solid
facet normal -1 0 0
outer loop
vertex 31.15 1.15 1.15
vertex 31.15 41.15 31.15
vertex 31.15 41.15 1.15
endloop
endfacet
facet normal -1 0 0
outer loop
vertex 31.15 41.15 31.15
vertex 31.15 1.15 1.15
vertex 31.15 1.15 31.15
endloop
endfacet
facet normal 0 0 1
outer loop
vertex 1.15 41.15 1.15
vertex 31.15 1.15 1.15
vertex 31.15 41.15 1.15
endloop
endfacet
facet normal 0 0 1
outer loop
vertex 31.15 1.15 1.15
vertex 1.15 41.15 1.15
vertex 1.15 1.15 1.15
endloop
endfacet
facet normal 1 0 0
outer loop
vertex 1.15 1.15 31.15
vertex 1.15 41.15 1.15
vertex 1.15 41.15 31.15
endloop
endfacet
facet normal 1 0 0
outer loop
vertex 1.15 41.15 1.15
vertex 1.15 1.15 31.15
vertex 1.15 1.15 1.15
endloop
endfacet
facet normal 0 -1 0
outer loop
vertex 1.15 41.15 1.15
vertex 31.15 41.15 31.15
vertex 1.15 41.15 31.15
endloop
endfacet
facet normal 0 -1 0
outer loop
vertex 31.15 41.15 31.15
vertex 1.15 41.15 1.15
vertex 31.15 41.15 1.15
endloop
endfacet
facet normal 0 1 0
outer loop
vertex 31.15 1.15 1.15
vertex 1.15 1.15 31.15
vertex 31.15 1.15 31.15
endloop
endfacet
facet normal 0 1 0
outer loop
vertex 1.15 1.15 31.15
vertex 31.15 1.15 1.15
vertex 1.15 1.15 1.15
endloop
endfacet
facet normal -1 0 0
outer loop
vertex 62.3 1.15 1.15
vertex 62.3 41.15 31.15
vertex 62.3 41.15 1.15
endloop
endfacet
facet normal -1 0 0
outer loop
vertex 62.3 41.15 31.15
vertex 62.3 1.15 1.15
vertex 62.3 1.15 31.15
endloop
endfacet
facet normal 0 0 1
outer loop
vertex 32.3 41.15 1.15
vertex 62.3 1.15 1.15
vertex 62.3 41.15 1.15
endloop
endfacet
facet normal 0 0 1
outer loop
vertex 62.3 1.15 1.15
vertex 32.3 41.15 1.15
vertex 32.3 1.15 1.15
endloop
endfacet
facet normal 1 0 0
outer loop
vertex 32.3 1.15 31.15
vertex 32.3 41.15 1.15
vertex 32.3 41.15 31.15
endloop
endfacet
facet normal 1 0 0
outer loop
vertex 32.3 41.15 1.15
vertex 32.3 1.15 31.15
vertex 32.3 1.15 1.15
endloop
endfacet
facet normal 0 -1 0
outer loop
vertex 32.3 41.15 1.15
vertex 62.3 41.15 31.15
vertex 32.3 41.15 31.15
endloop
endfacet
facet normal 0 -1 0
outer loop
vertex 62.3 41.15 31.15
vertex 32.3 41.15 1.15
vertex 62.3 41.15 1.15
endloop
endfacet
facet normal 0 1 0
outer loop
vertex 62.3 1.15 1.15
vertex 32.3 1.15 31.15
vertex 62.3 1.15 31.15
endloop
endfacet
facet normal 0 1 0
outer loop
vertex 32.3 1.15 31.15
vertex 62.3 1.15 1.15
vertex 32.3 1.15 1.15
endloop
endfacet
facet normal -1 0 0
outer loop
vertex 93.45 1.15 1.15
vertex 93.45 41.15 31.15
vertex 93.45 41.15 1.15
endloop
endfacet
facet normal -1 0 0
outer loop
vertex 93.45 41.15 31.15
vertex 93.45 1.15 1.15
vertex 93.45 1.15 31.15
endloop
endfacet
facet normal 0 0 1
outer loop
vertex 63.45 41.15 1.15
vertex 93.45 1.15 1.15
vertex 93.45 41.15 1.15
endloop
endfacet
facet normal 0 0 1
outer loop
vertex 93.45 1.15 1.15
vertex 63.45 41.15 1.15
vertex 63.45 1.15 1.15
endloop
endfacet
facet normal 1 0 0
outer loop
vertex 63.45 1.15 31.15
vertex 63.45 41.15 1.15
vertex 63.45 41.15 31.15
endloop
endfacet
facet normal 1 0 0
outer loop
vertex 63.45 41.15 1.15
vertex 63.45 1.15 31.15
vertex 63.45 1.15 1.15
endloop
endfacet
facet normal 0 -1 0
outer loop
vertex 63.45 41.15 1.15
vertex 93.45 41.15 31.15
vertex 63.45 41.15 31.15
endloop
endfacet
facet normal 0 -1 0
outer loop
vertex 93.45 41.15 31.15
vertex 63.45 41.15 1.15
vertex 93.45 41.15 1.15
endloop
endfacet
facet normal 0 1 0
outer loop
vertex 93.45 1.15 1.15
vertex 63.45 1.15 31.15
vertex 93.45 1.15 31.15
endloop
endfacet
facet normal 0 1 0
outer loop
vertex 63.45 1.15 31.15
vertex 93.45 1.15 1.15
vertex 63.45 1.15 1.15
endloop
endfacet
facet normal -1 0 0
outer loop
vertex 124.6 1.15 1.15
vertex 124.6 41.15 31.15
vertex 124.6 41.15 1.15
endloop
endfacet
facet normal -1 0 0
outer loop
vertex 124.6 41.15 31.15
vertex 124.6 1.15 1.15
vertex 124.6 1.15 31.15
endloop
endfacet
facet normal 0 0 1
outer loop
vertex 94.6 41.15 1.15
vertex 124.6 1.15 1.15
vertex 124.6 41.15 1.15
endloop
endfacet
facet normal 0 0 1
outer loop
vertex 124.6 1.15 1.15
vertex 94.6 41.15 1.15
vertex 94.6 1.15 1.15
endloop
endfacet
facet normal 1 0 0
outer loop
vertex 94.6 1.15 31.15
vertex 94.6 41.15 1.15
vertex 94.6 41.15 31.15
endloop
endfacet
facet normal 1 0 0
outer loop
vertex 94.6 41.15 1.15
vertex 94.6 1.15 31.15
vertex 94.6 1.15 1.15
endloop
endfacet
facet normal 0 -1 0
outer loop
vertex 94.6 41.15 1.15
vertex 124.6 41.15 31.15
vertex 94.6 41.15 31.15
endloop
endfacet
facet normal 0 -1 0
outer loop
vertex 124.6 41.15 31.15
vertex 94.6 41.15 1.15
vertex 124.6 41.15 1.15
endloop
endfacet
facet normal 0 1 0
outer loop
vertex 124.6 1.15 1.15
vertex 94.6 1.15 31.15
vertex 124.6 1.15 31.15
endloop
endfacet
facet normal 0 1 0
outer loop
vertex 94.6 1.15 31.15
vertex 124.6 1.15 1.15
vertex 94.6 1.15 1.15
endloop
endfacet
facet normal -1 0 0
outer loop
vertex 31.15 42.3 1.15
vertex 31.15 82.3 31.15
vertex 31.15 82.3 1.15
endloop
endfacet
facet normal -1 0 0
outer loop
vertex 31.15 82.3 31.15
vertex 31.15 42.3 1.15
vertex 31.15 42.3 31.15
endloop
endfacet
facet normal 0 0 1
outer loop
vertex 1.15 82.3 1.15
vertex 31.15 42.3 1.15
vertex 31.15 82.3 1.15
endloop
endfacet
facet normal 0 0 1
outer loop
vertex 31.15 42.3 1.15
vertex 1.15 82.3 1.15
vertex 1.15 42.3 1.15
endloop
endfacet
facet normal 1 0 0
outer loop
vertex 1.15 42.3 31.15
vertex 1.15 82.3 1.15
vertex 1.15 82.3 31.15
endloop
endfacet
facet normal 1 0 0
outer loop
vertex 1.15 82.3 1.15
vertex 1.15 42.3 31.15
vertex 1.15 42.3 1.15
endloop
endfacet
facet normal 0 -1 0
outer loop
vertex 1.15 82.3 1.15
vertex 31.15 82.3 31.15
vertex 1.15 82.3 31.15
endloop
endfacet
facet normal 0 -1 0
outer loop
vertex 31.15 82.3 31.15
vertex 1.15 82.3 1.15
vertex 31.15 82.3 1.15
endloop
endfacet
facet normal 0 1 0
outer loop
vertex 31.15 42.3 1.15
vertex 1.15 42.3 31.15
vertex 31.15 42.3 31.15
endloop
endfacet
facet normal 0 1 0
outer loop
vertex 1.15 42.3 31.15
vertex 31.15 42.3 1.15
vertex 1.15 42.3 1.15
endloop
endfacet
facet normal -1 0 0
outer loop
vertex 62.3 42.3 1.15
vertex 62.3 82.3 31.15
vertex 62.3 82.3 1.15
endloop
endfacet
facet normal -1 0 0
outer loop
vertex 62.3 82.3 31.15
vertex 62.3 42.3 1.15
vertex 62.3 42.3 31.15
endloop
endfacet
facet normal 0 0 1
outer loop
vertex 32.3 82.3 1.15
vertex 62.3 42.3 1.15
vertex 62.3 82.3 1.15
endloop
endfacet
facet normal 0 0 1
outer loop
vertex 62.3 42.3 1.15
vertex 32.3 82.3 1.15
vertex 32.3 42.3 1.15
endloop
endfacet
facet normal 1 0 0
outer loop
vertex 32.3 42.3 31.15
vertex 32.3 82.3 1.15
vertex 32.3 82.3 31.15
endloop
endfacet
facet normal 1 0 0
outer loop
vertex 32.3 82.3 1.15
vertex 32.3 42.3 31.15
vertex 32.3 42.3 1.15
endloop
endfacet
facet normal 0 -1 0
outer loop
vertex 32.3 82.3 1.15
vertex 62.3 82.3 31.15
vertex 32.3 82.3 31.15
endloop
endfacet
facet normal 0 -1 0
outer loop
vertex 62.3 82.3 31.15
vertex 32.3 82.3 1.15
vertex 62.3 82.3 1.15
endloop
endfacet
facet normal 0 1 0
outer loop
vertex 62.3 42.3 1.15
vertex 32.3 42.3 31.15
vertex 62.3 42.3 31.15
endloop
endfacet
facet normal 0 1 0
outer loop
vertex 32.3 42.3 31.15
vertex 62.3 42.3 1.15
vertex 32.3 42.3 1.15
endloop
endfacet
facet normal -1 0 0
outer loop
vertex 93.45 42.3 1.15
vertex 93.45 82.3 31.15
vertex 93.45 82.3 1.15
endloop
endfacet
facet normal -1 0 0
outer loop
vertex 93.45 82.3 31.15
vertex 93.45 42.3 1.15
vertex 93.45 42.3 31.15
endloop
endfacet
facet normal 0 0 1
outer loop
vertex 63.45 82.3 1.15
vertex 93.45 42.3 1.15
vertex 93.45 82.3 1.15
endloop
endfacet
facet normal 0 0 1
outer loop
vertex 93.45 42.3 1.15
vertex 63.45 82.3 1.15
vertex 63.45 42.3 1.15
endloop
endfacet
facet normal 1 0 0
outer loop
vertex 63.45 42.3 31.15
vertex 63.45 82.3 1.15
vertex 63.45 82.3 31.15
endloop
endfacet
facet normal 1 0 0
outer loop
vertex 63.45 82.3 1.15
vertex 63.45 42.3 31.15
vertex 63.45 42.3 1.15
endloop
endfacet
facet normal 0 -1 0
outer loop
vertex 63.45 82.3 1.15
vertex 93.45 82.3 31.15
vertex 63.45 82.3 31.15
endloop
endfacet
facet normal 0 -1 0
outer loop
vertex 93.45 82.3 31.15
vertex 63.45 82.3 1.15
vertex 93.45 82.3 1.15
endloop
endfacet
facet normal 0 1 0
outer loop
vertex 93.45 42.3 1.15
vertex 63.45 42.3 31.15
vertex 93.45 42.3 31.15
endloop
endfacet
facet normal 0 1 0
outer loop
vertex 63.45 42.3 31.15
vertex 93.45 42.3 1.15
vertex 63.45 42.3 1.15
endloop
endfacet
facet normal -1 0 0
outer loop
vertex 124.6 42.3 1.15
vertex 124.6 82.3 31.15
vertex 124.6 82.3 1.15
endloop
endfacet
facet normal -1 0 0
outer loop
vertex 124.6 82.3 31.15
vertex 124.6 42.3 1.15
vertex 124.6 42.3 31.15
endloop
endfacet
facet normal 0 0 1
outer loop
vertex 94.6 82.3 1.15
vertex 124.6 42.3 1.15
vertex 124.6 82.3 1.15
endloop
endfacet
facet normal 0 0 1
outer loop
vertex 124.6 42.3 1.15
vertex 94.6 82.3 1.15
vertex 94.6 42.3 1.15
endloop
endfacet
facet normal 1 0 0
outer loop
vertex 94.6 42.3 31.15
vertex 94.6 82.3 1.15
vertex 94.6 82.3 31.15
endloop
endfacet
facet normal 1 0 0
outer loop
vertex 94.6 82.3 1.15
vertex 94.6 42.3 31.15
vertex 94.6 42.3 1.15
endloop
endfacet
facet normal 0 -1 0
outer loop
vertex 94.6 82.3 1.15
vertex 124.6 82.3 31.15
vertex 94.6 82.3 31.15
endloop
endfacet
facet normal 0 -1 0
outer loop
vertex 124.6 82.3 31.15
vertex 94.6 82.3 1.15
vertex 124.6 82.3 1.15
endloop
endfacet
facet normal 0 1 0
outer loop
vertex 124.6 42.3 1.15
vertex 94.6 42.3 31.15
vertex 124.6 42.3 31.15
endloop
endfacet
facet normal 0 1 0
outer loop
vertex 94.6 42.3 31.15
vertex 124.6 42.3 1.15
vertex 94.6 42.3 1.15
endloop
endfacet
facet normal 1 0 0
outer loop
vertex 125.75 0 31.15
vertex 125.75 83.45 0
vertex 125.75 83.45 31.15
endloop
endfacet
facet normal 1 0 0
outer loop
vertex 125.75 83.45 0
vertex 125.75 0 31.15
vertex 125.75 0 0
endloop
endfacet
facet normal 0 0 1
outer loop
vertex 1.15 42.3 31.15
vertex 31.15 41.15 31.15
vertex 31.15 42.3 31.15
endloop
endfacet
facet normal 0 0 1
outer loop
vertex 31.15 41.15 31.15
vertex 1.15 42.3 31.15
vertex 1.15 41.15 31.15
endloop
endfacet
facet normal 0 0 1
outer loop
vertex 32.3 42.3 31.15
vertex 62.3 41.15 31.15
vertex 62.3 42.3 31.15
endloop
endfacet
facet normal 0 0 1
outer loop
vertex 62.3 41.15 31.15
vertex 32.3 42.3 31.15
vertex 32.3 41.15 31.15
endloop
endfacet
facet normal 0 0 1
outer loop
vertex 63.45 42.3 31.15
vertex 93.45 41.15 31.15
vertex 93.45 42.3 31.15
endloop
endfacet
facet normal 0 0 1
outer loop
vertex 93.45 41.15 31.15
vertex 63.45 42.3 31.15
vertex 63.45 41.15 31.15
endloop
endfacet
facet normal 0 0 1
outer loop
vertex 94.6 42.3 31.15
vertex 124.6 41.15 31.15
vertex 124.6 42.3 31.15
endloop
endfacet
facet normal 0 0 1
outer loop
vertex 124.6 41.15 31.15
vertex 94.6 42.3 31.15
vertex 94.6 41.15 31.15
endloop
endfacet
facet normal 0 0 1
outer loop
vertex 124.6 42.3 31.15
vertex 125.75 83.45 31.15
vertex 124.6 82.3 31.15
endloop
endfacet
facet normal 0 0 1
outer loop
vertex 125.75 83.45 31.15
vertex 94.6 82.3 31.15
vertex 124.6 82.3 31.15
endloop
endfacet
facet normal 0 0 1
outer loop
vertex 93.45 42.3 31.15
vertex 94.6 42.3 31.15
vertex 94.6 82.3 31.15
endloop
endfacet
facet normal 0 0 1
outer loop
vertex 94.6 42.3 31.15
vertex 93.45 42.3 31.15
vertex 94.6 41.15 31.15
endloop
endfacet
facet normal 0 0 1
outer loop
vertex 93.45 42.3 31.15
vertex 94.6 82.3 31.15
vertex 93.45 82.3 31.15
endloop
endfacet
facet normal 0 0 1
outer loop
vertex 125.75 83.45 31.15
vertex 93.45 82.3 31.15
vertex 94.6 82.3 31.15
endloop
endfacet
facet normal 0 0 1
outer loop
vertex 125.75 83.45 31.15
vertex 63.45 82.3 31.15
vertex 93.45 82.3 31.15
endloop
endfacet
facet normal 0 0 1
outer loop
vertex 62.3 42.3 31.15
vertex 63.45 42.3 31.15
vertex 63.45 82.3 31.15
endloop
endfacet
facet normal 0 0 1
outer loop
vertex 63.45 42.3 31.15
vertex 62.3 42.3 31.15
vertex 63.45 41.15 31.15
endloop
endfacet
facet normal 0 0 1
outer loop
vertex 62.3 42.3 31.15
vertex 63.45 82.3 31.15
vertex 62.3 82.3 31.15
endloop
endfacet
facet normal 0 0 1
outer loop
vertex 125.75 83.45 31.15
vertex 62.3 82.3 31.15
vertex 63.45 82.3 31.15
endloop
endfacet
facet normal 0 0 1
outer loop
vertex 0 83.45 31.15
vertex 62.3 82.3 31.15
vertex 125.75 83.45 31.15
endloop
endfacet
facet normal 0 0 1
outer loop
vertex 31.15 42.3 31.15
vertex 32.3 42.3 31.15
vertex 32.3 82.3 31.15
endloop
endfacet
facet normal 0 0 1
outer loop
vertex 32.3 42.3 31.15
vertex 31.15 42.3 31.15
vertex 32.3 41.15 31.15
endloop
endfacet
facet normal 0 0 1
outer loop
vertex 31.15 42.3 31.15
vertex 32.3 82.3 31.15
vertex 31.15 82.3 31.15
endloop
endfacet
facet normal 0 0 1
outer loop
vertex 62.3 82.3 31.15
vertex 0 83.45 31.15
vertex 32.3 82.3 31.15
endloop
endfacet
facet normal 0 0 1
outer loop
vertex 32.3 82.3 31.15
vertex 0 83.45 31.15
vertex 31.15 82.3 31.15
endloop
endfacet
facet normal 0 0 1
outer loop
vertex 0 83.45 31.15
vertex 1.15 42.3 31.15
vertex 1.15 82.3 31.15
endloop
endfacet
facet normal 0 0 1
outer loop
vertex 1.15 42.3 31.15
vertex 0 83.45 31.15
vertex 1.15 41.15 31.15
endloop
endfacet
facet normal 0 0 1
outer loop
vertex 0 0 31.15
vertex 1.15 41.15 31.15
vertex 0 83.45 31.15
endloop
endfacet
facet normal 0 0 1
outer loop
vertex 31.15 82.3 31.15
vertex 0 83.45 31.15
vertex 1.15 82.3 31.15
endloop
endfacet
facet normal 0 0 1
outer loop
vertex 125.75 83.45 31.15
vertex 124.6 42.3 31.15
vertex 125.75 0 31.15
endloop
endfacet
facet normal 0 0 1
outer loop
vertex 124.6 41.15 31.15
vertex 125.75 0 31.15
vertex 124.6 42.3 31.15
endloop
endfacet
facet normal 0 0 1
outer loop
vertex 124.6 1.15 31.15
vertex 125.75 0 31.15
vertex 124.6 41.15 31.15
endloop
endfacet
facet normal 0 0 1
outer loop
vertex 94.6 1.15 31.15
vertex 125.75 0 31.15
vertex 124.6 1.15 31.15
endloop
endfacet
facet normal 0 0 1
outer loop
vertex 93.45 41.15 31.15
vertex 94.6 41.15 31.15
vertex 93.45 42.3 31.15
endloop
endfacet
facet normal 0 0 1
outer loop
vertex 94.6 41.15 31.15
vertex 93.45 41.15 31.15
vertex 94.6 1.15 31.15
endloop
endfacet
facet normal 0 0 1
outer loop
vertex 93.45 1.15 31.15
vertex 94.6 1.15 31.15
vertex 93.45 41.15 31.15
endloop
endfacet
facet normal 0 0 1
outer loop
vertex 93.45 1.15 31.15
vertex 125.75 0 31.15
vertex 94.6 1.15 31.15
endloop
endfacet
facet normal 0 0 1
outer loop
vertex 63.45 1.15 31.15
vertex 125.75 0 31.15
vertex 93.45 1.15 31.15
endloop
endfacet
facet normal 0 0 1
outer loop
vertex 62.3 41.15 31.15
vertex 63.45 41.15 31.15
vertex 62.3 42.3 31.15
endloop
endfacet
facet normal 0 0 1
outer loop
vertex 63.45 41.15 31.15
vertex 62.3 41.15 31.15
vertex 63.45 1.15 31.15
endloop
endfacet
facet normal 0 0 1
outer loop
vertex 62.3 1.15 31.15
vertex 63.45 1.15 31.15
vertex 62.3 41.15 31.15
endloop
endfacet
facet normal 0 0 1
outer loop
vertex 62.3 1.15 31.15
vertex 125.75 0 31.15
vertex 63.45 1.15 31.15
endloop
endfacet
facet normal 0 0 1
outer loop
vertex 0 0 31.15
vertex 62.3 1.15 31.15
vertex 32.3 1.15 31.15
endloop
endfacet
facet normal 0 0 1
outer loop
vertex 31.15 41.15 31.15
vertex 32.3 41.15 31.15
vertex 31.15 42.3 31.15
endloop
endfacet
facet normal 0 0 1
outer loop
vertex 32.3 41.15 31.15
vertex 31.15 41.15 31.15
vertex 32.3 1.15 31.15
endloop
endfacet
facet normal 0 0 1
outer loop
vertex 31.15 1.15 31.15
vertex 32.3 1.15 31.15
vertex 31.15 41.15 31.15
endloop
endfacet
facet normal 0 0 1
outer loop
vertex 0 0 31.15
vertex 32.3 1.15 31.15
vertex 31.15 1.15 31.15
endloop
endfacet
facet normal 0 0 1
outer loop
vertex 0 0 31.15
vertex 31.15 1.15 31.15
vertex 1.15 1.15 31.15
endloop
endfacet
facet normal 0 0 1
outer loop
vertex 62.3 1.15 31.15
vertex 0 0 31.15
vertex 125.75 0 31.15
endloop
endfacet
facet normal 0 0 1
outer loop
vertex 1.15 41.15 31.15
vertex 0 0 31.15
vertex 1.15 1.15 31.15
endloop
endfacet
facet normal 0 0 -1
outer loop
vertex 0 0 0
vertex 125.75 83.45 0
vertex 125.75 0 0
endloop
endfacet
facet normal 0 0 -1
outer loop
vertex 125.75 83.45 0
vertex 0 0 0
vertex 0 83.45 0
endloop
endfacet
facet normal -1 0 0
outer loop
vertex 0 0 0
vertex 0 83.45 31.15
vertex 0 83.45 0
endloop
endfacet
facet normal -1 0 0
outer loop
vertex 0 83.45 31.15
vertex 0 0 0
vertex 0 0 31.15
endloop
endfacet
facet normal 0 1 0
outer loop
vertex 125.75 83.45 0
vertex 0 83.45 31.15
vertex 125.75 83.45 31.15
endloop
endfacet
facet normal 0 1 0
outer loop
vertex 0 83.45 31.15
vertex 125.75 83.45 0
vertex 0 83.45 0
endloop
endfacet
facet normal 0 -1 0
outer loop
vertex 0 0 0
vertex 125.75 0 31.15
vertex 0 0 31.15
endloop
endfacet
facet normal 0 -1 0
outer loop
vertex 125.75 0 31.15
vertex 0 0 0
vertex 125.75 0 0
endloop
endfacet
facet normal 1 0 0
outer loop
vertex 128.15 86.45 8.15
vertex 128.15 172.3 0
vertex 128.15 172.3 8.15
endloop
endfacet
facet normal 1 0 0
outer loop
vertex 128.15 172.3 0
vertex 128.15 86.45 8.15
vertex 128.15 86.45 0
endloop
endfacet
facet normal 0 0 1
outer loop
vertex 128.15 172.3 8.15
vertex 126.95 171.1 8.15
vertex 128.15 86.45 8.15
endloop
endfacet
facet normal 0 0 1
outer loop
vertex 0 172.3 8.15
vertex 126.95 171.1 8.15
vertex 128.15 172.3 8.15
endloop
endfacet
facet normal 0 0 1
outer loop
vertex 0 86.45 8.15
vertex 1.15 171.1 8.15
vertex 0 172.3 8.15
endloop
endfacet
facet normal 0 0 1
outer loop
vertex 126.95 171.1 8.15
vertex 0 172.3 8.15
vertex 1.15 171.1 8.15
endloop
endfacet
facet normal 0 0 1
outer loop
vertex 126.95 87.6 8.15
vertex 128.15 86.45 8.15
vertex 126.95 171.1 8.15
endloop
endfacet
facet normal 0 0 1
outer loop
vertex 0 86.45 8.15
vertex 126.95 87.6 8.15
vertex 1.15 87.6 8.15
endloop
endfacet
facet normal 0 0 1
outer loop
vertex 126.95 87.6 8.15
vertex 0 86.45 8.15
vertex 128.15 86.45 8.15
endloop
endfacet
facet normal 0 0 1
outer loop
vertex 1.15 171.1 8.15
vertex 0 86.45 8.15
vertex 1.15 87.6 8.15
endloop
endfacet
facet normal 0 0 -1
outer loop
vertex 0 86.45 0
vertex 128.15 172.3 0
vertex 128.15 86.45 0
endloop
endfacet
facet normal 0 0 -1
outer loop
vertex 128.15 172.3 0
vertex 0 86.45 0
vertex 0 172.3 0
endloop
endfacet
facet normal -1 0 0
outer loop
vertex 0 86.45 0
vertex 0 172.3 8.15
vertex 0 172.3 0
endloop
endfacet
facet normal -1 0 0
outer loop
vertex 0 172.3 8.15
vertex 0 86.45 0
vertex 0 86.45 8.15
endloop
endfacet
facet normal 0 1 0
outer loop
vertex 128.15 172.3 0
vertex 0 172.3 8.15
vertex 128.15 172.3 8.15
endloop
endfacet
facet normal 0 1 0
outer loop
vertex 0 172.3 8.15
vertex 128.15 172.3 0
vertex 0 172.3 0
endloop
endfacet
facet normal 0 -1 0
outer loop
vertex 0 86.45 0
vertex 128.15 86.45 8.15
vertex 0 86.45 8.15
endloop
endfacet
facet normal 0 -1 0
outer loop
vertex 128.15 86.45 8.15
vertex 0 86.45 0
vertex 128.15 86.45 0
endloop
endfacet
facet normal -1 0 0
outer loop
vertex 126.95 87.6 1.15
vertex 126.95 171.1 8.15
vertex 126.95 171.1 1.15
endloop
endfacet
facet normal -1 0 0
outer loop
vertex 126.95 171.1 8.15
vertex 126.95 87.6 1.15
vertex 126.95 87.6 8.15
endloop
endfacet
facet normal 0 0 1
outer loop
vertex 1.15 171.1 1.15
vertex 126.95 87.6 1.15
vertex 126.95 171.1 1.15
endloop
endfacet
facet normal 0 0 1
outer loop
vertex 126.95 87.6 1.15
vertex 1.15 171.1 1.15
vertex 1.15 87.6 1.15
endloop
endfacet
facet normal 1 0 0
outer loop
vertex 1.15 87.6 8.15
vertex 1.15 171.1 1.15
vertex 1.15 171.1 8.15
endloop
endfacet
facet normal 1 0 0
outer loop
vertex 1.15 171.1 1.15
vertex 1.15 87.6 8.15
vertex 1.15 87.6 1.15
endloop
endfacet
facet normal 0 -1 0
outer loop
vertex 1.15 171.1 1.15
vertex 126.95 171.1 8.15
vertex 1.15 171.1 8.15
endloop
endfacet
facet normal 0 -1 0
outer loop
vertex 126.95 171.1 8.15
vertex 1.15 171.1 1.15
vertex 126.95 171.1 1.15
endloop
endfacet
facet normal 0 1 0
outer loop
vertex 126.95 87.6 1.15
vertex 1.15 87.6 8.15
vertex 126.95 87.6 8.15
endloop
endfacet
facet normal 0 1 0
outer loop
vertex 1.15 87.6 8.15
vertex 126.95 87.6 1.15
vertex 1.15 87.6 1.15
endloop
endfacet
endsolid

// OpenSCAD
/* [Global] */


// Whether or not to generate the box
generate_box="yes";//[yes, no]

// Whether or not to generate the lid
generate_lid="yes";//[yes, no]

showlid = generate_lid=="yes"? true : false;

showbox = generate_box=="yes"? true : false;

Type_of_Lid = "Standard";//[Standard, Sliding]

lidtype = Type_of_Lid == "Standard"? 0 : 1;	// 0=Flat lid.  Use "1" for lid that slides off in the x direction


// Size of compartments, X
compx = 30;	


// Size of compartments, Y
compy = 40;	


// Width of wall, Make slightly larger then n*nozzle diameter. i.e. 1.15 for a 0.5 nozzle, should give a 2-pass thick wall
wall = 1.15;


// Number of compartments, X
nox = 4;


// Number of compartments, Y
noy = 2;



// Depth of compartments
deep = 30;	







// Tolerance around lid.  If it's too tight, increase this. If it's too loose, decrease it. 0.15 recommended for sliding lid
tolerance=.05;



// This is how far away from the box to print the lid
lidoffset=3;		


// How far the lid goes down the sides of the box. Only applies to Standard lid
lid_drop=7;
lidheight=lid_drop+wall;

//Adds a divit to sliding lid to make opening easer, no effect on standard lid
Thumb_Divit="yes"; //[yes, no]

includethumbhole = Thumb_Divit =="no"? false : true;


//Add a coin slot above every compartment
Coin_Slot="no"; //[yes, no]

includecoinslot=Coin_Slot == "no"? false: true;


//Size of Coin slot in X direction, default is slot thickness for United States Coins. Reverse X and Y to swap direction of slot
coinx=2.5;	
//Size of Coin slot in Y direction, default is slot width for United States Coins. Reverse X and Y to swap direction of slot
coiny=26;	



/* [Hidden] */

				// Z tolerance can be tweaked separately, to make the top of the sliding lid
				// be flush with the top of the box itself.  Default is zero.  Warning: this also
				// adds wiggle room to the lid.
                //Hidden from customizer, because more likely to mess up the box then help it.
ztolerance=0;

////////////////////
//start of objects
////////////////////

totalheight = deep + (lidtype*wall);
thumbrad = min(20,noy*(compy+wall)/3);

if (showbox) {
difference() {
	cube ( size = [nox * (compx + wall) + wall, noy * (compy + wall) + wall, (totalheight + wall)], center = false);


	for ( ybox = [ 0 : noy - 1])
		{
             for( xbox = [ 0 : nox - 1])
			{
			translate([ xbox * ( compx + wall ) + wall, ybox * ( compy + wall ) + wall, wall])
			cube ( size = [ compx, compy, totalheight+1 ]);
			}
		}
	if (lidtype==1) {
			translate ([0,wall/2,deep+wall]) 
			polyhedron ( points = [   
							[0,0,0], 
							[0,noy*(compy+wall),0], 
							[nox*(compx+wall)+wall/2,0,0], 
							[nox*(compx+wall)+wall/2,noy*(compy+wall),0],
							[0,wall/2,wall], 
							[0,noy*(compy+wall)-wall/2,wall], 
							[nox*(compx+wall)+wall/2,wall/2,wall], 
							[nox*(compx+wall)+wall/2,noy*(compy+wall)-wall/2,wall]
							],
						faces = [ 
							[0,2,1], [1,2,3], [4,5,6], [5,7,6]	,		// top and bottom
							[0,4,2], [4,6,2], [5,3,7], [5,1,3]	,		// angled sides
							[0,1,4], [1,5,4], [2,6,3], [3,6,7]			// trapezoidal ends
							]);
			translate ([0,wall/2,deep+wall-ztolerance])
			cube (size=[nox*(compx+wall)+wall/2,noy*(compy+wall),ztolerance],center=false);
			}

	}
}

if (showlid) {
translate ([0,noy*(compy+wall)+wall+lidoffset,0])
difference () { union () {	// for including coin slot
	if (lidtype==1) { 
		difference () {
		polyhedron ( points = [   
						[0,0,0], 
						[0,noy*(compy+wall)-2*tolerance,0], 
						[nox*(compx+wall)-tolerance+wall/2,0,0], 
						[nox*(compx+wall)-tolerance+wall/2,noy*(compy+wall)-2*tolerance,0],
						[0,wall/2,wall], 
						[0,noy*(compy+wall)-wall/2-2*tolerance,wall], 
						[nox*(compx+wall)-tolerance+wall/2,wall/2,wall], 
						[nox*(compx+wall)-tolerance+wall/2,noy*(compy+wall)-wall/2-2*tolerance,wall]
						],
					faces = [ 
						[0,2,1], [1,2,3], [4,5,6], [5,7,6]	,		// top and bottom
						[0,4,2], [4,6,2], [5,3,7], [5,1,3]	,		// angled sides
						[0,1,4], [1,5,4], [2,6,3], [3,6,7]			// trapezoidal ends
						]);
		// Thumb hole
		if (includethumbhole==true) {
			intersection () {
			translate ([min(8,nox*(compx+wall)/8),(noy*(compy+wall))/2,thumbrad+wall/2]) sphere (r=thumbrad, center=true, $fn=60);
			translate ([min(8,nox*(compx+wall)/8),0,0]) cube (size=[20,(noy*(compy+wall)),20], center=false);
		}
	}

		}
	} else {

	difference() {
	cube ( size = [nox * (compx + wall) + 3 * wall + 2* tolerance, noy * (compy + wall) + 3 * wall + 2*tolerance, lidheight], center = false);

	translate ([wall,wall,wall])
	cube ( size = [nox * (compx + wall) +wall+tolerance, noy * (compy + wall) + wall + tolerance, lidheight+1], center = false);
	}
} // if lidtype
} // union
if (includecoinslot==true) {
	for ( yslot = [ 0 : noy - 1])
		{
             for( xslot = [ 0 : nox - 1])
			{
			translate([ xslot * ( compx + wall ) + (2-lidtype)*wall + (compx-coinx)/2, yslot * ( compy + wall ) + wall*(2-3*lidtype/2) + (compy-coiny)/2, 0])
			cube ( size = [ coinx, coiny, wall ]);
			}
		}
	}
} //difference
} // if showlid



